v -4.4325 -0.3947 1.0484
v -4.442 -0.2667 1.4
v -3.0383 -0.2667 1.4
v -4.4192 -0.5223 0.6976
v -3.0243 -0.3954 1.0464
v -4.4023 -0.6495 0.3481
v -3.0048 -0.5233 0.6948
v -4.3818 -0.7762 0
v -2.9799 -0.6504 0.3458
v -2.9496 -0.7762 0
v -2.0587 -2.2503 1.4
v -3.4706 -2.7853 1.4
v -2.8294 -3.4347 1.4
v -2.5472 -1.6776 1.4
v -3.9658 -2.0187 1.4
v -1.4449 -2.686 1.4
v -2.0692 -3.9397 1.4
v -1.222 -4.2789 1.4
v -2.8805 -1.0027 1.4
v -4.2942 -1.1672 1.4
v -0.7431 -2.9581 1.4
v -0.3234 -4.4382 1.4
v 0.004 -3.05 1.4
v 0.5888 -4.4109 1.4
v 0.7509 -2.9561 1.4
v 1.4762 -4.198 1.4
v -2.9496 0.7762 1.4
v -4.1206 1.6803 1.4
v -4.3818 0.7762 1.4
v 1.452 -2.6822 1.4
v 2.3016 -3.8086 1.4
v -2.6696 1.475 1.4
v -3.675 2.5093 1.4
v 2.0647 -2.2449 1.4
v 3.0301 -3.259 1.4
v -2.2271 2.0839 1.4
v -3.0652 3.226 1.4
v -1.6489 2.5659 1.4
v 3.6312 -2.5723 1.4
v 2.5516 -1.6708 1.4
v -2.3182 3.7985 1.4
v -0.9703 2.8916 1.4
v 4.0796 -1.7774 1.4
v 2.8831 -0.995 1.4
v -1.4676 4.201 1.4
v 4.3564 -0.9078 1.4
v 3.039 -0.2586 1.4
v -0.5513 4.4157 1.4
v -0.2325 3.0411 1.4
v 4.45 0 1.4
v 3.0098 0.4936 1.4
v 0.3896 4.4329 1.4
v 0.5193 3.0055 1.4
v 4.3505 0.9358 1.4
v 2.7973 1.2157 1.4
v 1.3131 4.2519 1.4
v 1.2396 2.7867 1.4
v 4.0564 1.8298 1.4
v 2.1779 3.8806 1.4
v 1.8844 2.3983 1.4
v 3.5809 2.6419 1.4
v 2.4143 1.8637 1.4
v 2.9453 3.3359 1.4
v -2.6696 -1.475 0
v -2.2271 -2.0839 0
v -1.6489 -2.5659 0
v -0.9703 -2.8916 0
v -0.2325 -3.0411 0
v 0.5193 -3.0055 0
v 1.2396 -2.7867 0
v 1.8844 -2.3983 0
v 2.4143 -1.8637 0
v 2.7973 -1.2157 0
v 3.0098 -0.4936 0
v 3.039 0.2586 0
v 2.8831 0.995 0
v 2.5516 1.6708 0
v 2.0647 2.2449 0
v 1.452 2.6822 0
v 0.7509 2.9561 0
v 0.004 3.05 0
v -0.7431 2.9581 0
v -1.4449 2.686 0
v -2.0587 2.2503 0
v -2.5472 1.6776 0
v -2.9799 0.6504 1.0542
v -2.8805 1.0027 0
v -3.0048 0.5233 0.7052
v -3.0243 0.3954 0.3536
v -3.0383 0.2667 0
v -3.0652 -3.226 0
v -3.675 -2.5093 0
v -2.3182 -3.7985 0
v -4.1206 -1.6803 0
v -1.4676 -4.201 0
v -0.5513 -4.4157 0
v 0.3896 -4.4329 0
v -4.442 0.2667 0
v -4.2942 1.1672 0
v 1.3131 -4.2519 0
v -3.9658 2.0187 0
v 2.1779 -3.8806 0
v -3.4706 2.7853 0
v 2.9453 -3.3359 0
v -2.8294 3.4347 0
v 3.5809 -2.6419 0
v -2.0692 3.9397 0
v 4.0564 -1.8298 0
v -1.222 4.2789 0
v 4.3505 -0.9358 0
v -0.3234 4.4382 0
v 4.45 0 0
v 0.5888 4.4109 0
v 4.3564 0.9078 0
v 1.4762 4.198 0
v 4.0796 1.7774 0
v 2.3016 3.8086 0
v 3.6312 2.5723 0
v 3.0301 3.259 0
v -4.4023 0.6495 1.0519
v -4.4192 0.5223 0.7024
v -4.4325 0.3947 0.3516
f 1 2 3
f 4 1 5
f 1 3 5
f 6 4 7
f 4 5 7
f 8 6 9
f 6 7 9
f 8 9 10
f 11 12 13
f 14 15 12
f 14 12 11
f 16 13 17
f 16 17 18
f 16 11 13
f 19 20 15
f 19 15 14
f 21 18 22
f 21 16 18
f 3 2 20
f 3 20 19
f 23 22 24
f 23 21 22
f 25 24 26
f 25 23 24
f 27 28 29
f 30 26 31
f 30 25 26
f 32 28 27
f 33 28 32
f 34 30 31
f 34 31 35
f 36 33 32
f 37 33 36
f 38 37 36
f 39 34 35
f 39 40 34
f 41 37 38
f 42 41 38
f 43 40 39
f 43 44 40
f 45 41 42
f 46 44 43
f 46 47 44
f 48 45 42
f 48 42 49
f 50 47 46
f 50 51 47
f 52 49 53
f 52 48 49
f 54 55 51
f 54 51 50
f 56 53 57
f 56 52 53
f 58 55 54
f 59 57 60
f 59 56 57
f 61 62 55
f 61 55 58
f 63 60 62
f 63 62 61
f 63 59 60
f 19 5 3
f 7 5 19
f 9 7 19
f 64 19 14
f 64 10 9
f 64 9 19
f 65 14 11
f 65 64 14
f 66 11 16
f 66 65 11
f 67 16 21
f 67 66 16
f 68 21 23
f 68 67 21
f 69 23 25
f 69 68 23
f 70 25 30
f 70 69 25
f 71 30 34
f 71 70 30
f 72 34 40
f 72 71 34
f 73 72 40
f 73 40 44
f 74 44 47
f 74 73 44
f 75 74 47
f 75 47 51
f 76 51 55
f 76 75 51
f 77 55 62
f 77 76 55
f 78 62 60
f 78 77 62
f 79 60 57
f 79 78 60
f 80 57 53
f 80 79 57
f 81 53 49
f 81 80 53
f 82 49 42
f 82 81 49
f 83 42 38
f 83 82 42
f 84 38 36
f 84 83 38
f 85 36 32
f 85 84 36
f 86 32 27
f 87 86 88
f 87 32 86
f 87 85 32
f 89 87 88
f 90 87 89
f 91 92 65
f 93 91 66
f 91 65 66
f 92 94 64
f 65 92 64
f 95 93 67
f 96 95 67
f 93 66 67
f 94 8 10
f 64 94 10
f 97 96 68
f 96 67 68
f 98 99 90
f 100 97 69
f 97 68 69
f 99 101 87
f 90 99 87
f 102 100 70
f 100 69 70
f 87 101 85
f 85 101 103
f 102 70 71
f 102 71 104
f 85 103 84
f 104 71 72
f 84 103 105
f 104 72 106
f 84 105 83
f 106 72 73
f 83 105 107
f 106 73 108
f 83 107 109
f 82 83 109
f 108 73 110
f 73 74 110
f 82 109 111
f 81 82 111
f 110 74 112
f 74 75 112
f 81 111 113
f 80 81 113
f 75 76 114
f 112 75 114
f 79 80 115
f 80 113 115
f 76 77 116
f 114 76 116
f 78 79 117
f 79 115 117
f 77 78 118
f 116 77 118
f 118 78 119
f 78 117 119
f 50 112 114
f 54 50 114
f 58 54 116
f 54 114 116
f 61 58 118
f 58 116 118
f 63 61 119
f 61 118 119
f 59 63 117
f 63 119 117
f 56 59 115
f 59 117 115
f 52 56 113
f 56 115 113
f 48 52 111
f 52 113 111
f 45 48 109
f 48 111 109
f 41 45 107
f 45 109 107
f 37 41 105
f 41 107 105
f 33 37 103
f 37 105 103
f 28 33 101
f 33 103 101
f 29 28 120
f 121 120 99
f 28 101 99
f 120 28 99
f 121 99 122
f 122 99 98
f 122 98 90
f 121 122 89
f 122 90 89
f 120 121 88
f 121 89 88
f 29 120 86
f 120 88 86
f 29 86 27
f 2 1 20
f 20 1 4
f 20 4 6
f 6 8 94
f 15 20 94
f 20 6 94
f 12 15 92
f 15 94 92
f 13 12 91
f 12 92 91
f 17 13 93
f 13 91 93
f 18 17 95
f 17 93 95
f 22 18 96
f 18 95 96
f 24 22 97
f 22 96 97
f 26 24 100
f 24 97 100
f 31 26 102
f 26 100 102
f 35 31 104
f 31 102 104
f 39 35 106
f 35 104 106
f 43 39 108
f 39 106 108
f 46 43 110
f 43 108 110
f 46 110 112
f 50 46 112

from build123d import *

# Parameters (mm, degrees)
SKETCH_1_R          = 4.45
SKETCH_1_R_2        = 3.05
EXTRUDE_1_DEPTH     = 1.4
CUT_EXTRUDE_1_DEPTH = 7.447092368


with BuildPart() as part:
    # Эскиз1 → Вытянуть1 (new body)
    with BuildSketch(Plane.XY):
        Circle(SKETCH_1_R)
        Circle(SKETCH_1_R_2, mode=Mode.SUBTRACT)
    extrude(amount=EXTRUDE_1_DEPTH)

    # Эскиз2 → Вырез-Вытянуть1 (cut, through all)
    with BuildSketch(Plane(origin=(0, 0, 0), x_dir=(0, 0, -1), z_dir=(1, 0, 0))):
        Polygon((0, 0.266667945), (-1.4, 0.776226272), (-1.4, 0), (-1.4, -0.266667945), (0, -0.776226272), (0, 0), align=None)
    extrude(amount=-CUT_EXTRUDE_1_DEPTH, mode=Mode.SUBTRACT)


solid = part.part
